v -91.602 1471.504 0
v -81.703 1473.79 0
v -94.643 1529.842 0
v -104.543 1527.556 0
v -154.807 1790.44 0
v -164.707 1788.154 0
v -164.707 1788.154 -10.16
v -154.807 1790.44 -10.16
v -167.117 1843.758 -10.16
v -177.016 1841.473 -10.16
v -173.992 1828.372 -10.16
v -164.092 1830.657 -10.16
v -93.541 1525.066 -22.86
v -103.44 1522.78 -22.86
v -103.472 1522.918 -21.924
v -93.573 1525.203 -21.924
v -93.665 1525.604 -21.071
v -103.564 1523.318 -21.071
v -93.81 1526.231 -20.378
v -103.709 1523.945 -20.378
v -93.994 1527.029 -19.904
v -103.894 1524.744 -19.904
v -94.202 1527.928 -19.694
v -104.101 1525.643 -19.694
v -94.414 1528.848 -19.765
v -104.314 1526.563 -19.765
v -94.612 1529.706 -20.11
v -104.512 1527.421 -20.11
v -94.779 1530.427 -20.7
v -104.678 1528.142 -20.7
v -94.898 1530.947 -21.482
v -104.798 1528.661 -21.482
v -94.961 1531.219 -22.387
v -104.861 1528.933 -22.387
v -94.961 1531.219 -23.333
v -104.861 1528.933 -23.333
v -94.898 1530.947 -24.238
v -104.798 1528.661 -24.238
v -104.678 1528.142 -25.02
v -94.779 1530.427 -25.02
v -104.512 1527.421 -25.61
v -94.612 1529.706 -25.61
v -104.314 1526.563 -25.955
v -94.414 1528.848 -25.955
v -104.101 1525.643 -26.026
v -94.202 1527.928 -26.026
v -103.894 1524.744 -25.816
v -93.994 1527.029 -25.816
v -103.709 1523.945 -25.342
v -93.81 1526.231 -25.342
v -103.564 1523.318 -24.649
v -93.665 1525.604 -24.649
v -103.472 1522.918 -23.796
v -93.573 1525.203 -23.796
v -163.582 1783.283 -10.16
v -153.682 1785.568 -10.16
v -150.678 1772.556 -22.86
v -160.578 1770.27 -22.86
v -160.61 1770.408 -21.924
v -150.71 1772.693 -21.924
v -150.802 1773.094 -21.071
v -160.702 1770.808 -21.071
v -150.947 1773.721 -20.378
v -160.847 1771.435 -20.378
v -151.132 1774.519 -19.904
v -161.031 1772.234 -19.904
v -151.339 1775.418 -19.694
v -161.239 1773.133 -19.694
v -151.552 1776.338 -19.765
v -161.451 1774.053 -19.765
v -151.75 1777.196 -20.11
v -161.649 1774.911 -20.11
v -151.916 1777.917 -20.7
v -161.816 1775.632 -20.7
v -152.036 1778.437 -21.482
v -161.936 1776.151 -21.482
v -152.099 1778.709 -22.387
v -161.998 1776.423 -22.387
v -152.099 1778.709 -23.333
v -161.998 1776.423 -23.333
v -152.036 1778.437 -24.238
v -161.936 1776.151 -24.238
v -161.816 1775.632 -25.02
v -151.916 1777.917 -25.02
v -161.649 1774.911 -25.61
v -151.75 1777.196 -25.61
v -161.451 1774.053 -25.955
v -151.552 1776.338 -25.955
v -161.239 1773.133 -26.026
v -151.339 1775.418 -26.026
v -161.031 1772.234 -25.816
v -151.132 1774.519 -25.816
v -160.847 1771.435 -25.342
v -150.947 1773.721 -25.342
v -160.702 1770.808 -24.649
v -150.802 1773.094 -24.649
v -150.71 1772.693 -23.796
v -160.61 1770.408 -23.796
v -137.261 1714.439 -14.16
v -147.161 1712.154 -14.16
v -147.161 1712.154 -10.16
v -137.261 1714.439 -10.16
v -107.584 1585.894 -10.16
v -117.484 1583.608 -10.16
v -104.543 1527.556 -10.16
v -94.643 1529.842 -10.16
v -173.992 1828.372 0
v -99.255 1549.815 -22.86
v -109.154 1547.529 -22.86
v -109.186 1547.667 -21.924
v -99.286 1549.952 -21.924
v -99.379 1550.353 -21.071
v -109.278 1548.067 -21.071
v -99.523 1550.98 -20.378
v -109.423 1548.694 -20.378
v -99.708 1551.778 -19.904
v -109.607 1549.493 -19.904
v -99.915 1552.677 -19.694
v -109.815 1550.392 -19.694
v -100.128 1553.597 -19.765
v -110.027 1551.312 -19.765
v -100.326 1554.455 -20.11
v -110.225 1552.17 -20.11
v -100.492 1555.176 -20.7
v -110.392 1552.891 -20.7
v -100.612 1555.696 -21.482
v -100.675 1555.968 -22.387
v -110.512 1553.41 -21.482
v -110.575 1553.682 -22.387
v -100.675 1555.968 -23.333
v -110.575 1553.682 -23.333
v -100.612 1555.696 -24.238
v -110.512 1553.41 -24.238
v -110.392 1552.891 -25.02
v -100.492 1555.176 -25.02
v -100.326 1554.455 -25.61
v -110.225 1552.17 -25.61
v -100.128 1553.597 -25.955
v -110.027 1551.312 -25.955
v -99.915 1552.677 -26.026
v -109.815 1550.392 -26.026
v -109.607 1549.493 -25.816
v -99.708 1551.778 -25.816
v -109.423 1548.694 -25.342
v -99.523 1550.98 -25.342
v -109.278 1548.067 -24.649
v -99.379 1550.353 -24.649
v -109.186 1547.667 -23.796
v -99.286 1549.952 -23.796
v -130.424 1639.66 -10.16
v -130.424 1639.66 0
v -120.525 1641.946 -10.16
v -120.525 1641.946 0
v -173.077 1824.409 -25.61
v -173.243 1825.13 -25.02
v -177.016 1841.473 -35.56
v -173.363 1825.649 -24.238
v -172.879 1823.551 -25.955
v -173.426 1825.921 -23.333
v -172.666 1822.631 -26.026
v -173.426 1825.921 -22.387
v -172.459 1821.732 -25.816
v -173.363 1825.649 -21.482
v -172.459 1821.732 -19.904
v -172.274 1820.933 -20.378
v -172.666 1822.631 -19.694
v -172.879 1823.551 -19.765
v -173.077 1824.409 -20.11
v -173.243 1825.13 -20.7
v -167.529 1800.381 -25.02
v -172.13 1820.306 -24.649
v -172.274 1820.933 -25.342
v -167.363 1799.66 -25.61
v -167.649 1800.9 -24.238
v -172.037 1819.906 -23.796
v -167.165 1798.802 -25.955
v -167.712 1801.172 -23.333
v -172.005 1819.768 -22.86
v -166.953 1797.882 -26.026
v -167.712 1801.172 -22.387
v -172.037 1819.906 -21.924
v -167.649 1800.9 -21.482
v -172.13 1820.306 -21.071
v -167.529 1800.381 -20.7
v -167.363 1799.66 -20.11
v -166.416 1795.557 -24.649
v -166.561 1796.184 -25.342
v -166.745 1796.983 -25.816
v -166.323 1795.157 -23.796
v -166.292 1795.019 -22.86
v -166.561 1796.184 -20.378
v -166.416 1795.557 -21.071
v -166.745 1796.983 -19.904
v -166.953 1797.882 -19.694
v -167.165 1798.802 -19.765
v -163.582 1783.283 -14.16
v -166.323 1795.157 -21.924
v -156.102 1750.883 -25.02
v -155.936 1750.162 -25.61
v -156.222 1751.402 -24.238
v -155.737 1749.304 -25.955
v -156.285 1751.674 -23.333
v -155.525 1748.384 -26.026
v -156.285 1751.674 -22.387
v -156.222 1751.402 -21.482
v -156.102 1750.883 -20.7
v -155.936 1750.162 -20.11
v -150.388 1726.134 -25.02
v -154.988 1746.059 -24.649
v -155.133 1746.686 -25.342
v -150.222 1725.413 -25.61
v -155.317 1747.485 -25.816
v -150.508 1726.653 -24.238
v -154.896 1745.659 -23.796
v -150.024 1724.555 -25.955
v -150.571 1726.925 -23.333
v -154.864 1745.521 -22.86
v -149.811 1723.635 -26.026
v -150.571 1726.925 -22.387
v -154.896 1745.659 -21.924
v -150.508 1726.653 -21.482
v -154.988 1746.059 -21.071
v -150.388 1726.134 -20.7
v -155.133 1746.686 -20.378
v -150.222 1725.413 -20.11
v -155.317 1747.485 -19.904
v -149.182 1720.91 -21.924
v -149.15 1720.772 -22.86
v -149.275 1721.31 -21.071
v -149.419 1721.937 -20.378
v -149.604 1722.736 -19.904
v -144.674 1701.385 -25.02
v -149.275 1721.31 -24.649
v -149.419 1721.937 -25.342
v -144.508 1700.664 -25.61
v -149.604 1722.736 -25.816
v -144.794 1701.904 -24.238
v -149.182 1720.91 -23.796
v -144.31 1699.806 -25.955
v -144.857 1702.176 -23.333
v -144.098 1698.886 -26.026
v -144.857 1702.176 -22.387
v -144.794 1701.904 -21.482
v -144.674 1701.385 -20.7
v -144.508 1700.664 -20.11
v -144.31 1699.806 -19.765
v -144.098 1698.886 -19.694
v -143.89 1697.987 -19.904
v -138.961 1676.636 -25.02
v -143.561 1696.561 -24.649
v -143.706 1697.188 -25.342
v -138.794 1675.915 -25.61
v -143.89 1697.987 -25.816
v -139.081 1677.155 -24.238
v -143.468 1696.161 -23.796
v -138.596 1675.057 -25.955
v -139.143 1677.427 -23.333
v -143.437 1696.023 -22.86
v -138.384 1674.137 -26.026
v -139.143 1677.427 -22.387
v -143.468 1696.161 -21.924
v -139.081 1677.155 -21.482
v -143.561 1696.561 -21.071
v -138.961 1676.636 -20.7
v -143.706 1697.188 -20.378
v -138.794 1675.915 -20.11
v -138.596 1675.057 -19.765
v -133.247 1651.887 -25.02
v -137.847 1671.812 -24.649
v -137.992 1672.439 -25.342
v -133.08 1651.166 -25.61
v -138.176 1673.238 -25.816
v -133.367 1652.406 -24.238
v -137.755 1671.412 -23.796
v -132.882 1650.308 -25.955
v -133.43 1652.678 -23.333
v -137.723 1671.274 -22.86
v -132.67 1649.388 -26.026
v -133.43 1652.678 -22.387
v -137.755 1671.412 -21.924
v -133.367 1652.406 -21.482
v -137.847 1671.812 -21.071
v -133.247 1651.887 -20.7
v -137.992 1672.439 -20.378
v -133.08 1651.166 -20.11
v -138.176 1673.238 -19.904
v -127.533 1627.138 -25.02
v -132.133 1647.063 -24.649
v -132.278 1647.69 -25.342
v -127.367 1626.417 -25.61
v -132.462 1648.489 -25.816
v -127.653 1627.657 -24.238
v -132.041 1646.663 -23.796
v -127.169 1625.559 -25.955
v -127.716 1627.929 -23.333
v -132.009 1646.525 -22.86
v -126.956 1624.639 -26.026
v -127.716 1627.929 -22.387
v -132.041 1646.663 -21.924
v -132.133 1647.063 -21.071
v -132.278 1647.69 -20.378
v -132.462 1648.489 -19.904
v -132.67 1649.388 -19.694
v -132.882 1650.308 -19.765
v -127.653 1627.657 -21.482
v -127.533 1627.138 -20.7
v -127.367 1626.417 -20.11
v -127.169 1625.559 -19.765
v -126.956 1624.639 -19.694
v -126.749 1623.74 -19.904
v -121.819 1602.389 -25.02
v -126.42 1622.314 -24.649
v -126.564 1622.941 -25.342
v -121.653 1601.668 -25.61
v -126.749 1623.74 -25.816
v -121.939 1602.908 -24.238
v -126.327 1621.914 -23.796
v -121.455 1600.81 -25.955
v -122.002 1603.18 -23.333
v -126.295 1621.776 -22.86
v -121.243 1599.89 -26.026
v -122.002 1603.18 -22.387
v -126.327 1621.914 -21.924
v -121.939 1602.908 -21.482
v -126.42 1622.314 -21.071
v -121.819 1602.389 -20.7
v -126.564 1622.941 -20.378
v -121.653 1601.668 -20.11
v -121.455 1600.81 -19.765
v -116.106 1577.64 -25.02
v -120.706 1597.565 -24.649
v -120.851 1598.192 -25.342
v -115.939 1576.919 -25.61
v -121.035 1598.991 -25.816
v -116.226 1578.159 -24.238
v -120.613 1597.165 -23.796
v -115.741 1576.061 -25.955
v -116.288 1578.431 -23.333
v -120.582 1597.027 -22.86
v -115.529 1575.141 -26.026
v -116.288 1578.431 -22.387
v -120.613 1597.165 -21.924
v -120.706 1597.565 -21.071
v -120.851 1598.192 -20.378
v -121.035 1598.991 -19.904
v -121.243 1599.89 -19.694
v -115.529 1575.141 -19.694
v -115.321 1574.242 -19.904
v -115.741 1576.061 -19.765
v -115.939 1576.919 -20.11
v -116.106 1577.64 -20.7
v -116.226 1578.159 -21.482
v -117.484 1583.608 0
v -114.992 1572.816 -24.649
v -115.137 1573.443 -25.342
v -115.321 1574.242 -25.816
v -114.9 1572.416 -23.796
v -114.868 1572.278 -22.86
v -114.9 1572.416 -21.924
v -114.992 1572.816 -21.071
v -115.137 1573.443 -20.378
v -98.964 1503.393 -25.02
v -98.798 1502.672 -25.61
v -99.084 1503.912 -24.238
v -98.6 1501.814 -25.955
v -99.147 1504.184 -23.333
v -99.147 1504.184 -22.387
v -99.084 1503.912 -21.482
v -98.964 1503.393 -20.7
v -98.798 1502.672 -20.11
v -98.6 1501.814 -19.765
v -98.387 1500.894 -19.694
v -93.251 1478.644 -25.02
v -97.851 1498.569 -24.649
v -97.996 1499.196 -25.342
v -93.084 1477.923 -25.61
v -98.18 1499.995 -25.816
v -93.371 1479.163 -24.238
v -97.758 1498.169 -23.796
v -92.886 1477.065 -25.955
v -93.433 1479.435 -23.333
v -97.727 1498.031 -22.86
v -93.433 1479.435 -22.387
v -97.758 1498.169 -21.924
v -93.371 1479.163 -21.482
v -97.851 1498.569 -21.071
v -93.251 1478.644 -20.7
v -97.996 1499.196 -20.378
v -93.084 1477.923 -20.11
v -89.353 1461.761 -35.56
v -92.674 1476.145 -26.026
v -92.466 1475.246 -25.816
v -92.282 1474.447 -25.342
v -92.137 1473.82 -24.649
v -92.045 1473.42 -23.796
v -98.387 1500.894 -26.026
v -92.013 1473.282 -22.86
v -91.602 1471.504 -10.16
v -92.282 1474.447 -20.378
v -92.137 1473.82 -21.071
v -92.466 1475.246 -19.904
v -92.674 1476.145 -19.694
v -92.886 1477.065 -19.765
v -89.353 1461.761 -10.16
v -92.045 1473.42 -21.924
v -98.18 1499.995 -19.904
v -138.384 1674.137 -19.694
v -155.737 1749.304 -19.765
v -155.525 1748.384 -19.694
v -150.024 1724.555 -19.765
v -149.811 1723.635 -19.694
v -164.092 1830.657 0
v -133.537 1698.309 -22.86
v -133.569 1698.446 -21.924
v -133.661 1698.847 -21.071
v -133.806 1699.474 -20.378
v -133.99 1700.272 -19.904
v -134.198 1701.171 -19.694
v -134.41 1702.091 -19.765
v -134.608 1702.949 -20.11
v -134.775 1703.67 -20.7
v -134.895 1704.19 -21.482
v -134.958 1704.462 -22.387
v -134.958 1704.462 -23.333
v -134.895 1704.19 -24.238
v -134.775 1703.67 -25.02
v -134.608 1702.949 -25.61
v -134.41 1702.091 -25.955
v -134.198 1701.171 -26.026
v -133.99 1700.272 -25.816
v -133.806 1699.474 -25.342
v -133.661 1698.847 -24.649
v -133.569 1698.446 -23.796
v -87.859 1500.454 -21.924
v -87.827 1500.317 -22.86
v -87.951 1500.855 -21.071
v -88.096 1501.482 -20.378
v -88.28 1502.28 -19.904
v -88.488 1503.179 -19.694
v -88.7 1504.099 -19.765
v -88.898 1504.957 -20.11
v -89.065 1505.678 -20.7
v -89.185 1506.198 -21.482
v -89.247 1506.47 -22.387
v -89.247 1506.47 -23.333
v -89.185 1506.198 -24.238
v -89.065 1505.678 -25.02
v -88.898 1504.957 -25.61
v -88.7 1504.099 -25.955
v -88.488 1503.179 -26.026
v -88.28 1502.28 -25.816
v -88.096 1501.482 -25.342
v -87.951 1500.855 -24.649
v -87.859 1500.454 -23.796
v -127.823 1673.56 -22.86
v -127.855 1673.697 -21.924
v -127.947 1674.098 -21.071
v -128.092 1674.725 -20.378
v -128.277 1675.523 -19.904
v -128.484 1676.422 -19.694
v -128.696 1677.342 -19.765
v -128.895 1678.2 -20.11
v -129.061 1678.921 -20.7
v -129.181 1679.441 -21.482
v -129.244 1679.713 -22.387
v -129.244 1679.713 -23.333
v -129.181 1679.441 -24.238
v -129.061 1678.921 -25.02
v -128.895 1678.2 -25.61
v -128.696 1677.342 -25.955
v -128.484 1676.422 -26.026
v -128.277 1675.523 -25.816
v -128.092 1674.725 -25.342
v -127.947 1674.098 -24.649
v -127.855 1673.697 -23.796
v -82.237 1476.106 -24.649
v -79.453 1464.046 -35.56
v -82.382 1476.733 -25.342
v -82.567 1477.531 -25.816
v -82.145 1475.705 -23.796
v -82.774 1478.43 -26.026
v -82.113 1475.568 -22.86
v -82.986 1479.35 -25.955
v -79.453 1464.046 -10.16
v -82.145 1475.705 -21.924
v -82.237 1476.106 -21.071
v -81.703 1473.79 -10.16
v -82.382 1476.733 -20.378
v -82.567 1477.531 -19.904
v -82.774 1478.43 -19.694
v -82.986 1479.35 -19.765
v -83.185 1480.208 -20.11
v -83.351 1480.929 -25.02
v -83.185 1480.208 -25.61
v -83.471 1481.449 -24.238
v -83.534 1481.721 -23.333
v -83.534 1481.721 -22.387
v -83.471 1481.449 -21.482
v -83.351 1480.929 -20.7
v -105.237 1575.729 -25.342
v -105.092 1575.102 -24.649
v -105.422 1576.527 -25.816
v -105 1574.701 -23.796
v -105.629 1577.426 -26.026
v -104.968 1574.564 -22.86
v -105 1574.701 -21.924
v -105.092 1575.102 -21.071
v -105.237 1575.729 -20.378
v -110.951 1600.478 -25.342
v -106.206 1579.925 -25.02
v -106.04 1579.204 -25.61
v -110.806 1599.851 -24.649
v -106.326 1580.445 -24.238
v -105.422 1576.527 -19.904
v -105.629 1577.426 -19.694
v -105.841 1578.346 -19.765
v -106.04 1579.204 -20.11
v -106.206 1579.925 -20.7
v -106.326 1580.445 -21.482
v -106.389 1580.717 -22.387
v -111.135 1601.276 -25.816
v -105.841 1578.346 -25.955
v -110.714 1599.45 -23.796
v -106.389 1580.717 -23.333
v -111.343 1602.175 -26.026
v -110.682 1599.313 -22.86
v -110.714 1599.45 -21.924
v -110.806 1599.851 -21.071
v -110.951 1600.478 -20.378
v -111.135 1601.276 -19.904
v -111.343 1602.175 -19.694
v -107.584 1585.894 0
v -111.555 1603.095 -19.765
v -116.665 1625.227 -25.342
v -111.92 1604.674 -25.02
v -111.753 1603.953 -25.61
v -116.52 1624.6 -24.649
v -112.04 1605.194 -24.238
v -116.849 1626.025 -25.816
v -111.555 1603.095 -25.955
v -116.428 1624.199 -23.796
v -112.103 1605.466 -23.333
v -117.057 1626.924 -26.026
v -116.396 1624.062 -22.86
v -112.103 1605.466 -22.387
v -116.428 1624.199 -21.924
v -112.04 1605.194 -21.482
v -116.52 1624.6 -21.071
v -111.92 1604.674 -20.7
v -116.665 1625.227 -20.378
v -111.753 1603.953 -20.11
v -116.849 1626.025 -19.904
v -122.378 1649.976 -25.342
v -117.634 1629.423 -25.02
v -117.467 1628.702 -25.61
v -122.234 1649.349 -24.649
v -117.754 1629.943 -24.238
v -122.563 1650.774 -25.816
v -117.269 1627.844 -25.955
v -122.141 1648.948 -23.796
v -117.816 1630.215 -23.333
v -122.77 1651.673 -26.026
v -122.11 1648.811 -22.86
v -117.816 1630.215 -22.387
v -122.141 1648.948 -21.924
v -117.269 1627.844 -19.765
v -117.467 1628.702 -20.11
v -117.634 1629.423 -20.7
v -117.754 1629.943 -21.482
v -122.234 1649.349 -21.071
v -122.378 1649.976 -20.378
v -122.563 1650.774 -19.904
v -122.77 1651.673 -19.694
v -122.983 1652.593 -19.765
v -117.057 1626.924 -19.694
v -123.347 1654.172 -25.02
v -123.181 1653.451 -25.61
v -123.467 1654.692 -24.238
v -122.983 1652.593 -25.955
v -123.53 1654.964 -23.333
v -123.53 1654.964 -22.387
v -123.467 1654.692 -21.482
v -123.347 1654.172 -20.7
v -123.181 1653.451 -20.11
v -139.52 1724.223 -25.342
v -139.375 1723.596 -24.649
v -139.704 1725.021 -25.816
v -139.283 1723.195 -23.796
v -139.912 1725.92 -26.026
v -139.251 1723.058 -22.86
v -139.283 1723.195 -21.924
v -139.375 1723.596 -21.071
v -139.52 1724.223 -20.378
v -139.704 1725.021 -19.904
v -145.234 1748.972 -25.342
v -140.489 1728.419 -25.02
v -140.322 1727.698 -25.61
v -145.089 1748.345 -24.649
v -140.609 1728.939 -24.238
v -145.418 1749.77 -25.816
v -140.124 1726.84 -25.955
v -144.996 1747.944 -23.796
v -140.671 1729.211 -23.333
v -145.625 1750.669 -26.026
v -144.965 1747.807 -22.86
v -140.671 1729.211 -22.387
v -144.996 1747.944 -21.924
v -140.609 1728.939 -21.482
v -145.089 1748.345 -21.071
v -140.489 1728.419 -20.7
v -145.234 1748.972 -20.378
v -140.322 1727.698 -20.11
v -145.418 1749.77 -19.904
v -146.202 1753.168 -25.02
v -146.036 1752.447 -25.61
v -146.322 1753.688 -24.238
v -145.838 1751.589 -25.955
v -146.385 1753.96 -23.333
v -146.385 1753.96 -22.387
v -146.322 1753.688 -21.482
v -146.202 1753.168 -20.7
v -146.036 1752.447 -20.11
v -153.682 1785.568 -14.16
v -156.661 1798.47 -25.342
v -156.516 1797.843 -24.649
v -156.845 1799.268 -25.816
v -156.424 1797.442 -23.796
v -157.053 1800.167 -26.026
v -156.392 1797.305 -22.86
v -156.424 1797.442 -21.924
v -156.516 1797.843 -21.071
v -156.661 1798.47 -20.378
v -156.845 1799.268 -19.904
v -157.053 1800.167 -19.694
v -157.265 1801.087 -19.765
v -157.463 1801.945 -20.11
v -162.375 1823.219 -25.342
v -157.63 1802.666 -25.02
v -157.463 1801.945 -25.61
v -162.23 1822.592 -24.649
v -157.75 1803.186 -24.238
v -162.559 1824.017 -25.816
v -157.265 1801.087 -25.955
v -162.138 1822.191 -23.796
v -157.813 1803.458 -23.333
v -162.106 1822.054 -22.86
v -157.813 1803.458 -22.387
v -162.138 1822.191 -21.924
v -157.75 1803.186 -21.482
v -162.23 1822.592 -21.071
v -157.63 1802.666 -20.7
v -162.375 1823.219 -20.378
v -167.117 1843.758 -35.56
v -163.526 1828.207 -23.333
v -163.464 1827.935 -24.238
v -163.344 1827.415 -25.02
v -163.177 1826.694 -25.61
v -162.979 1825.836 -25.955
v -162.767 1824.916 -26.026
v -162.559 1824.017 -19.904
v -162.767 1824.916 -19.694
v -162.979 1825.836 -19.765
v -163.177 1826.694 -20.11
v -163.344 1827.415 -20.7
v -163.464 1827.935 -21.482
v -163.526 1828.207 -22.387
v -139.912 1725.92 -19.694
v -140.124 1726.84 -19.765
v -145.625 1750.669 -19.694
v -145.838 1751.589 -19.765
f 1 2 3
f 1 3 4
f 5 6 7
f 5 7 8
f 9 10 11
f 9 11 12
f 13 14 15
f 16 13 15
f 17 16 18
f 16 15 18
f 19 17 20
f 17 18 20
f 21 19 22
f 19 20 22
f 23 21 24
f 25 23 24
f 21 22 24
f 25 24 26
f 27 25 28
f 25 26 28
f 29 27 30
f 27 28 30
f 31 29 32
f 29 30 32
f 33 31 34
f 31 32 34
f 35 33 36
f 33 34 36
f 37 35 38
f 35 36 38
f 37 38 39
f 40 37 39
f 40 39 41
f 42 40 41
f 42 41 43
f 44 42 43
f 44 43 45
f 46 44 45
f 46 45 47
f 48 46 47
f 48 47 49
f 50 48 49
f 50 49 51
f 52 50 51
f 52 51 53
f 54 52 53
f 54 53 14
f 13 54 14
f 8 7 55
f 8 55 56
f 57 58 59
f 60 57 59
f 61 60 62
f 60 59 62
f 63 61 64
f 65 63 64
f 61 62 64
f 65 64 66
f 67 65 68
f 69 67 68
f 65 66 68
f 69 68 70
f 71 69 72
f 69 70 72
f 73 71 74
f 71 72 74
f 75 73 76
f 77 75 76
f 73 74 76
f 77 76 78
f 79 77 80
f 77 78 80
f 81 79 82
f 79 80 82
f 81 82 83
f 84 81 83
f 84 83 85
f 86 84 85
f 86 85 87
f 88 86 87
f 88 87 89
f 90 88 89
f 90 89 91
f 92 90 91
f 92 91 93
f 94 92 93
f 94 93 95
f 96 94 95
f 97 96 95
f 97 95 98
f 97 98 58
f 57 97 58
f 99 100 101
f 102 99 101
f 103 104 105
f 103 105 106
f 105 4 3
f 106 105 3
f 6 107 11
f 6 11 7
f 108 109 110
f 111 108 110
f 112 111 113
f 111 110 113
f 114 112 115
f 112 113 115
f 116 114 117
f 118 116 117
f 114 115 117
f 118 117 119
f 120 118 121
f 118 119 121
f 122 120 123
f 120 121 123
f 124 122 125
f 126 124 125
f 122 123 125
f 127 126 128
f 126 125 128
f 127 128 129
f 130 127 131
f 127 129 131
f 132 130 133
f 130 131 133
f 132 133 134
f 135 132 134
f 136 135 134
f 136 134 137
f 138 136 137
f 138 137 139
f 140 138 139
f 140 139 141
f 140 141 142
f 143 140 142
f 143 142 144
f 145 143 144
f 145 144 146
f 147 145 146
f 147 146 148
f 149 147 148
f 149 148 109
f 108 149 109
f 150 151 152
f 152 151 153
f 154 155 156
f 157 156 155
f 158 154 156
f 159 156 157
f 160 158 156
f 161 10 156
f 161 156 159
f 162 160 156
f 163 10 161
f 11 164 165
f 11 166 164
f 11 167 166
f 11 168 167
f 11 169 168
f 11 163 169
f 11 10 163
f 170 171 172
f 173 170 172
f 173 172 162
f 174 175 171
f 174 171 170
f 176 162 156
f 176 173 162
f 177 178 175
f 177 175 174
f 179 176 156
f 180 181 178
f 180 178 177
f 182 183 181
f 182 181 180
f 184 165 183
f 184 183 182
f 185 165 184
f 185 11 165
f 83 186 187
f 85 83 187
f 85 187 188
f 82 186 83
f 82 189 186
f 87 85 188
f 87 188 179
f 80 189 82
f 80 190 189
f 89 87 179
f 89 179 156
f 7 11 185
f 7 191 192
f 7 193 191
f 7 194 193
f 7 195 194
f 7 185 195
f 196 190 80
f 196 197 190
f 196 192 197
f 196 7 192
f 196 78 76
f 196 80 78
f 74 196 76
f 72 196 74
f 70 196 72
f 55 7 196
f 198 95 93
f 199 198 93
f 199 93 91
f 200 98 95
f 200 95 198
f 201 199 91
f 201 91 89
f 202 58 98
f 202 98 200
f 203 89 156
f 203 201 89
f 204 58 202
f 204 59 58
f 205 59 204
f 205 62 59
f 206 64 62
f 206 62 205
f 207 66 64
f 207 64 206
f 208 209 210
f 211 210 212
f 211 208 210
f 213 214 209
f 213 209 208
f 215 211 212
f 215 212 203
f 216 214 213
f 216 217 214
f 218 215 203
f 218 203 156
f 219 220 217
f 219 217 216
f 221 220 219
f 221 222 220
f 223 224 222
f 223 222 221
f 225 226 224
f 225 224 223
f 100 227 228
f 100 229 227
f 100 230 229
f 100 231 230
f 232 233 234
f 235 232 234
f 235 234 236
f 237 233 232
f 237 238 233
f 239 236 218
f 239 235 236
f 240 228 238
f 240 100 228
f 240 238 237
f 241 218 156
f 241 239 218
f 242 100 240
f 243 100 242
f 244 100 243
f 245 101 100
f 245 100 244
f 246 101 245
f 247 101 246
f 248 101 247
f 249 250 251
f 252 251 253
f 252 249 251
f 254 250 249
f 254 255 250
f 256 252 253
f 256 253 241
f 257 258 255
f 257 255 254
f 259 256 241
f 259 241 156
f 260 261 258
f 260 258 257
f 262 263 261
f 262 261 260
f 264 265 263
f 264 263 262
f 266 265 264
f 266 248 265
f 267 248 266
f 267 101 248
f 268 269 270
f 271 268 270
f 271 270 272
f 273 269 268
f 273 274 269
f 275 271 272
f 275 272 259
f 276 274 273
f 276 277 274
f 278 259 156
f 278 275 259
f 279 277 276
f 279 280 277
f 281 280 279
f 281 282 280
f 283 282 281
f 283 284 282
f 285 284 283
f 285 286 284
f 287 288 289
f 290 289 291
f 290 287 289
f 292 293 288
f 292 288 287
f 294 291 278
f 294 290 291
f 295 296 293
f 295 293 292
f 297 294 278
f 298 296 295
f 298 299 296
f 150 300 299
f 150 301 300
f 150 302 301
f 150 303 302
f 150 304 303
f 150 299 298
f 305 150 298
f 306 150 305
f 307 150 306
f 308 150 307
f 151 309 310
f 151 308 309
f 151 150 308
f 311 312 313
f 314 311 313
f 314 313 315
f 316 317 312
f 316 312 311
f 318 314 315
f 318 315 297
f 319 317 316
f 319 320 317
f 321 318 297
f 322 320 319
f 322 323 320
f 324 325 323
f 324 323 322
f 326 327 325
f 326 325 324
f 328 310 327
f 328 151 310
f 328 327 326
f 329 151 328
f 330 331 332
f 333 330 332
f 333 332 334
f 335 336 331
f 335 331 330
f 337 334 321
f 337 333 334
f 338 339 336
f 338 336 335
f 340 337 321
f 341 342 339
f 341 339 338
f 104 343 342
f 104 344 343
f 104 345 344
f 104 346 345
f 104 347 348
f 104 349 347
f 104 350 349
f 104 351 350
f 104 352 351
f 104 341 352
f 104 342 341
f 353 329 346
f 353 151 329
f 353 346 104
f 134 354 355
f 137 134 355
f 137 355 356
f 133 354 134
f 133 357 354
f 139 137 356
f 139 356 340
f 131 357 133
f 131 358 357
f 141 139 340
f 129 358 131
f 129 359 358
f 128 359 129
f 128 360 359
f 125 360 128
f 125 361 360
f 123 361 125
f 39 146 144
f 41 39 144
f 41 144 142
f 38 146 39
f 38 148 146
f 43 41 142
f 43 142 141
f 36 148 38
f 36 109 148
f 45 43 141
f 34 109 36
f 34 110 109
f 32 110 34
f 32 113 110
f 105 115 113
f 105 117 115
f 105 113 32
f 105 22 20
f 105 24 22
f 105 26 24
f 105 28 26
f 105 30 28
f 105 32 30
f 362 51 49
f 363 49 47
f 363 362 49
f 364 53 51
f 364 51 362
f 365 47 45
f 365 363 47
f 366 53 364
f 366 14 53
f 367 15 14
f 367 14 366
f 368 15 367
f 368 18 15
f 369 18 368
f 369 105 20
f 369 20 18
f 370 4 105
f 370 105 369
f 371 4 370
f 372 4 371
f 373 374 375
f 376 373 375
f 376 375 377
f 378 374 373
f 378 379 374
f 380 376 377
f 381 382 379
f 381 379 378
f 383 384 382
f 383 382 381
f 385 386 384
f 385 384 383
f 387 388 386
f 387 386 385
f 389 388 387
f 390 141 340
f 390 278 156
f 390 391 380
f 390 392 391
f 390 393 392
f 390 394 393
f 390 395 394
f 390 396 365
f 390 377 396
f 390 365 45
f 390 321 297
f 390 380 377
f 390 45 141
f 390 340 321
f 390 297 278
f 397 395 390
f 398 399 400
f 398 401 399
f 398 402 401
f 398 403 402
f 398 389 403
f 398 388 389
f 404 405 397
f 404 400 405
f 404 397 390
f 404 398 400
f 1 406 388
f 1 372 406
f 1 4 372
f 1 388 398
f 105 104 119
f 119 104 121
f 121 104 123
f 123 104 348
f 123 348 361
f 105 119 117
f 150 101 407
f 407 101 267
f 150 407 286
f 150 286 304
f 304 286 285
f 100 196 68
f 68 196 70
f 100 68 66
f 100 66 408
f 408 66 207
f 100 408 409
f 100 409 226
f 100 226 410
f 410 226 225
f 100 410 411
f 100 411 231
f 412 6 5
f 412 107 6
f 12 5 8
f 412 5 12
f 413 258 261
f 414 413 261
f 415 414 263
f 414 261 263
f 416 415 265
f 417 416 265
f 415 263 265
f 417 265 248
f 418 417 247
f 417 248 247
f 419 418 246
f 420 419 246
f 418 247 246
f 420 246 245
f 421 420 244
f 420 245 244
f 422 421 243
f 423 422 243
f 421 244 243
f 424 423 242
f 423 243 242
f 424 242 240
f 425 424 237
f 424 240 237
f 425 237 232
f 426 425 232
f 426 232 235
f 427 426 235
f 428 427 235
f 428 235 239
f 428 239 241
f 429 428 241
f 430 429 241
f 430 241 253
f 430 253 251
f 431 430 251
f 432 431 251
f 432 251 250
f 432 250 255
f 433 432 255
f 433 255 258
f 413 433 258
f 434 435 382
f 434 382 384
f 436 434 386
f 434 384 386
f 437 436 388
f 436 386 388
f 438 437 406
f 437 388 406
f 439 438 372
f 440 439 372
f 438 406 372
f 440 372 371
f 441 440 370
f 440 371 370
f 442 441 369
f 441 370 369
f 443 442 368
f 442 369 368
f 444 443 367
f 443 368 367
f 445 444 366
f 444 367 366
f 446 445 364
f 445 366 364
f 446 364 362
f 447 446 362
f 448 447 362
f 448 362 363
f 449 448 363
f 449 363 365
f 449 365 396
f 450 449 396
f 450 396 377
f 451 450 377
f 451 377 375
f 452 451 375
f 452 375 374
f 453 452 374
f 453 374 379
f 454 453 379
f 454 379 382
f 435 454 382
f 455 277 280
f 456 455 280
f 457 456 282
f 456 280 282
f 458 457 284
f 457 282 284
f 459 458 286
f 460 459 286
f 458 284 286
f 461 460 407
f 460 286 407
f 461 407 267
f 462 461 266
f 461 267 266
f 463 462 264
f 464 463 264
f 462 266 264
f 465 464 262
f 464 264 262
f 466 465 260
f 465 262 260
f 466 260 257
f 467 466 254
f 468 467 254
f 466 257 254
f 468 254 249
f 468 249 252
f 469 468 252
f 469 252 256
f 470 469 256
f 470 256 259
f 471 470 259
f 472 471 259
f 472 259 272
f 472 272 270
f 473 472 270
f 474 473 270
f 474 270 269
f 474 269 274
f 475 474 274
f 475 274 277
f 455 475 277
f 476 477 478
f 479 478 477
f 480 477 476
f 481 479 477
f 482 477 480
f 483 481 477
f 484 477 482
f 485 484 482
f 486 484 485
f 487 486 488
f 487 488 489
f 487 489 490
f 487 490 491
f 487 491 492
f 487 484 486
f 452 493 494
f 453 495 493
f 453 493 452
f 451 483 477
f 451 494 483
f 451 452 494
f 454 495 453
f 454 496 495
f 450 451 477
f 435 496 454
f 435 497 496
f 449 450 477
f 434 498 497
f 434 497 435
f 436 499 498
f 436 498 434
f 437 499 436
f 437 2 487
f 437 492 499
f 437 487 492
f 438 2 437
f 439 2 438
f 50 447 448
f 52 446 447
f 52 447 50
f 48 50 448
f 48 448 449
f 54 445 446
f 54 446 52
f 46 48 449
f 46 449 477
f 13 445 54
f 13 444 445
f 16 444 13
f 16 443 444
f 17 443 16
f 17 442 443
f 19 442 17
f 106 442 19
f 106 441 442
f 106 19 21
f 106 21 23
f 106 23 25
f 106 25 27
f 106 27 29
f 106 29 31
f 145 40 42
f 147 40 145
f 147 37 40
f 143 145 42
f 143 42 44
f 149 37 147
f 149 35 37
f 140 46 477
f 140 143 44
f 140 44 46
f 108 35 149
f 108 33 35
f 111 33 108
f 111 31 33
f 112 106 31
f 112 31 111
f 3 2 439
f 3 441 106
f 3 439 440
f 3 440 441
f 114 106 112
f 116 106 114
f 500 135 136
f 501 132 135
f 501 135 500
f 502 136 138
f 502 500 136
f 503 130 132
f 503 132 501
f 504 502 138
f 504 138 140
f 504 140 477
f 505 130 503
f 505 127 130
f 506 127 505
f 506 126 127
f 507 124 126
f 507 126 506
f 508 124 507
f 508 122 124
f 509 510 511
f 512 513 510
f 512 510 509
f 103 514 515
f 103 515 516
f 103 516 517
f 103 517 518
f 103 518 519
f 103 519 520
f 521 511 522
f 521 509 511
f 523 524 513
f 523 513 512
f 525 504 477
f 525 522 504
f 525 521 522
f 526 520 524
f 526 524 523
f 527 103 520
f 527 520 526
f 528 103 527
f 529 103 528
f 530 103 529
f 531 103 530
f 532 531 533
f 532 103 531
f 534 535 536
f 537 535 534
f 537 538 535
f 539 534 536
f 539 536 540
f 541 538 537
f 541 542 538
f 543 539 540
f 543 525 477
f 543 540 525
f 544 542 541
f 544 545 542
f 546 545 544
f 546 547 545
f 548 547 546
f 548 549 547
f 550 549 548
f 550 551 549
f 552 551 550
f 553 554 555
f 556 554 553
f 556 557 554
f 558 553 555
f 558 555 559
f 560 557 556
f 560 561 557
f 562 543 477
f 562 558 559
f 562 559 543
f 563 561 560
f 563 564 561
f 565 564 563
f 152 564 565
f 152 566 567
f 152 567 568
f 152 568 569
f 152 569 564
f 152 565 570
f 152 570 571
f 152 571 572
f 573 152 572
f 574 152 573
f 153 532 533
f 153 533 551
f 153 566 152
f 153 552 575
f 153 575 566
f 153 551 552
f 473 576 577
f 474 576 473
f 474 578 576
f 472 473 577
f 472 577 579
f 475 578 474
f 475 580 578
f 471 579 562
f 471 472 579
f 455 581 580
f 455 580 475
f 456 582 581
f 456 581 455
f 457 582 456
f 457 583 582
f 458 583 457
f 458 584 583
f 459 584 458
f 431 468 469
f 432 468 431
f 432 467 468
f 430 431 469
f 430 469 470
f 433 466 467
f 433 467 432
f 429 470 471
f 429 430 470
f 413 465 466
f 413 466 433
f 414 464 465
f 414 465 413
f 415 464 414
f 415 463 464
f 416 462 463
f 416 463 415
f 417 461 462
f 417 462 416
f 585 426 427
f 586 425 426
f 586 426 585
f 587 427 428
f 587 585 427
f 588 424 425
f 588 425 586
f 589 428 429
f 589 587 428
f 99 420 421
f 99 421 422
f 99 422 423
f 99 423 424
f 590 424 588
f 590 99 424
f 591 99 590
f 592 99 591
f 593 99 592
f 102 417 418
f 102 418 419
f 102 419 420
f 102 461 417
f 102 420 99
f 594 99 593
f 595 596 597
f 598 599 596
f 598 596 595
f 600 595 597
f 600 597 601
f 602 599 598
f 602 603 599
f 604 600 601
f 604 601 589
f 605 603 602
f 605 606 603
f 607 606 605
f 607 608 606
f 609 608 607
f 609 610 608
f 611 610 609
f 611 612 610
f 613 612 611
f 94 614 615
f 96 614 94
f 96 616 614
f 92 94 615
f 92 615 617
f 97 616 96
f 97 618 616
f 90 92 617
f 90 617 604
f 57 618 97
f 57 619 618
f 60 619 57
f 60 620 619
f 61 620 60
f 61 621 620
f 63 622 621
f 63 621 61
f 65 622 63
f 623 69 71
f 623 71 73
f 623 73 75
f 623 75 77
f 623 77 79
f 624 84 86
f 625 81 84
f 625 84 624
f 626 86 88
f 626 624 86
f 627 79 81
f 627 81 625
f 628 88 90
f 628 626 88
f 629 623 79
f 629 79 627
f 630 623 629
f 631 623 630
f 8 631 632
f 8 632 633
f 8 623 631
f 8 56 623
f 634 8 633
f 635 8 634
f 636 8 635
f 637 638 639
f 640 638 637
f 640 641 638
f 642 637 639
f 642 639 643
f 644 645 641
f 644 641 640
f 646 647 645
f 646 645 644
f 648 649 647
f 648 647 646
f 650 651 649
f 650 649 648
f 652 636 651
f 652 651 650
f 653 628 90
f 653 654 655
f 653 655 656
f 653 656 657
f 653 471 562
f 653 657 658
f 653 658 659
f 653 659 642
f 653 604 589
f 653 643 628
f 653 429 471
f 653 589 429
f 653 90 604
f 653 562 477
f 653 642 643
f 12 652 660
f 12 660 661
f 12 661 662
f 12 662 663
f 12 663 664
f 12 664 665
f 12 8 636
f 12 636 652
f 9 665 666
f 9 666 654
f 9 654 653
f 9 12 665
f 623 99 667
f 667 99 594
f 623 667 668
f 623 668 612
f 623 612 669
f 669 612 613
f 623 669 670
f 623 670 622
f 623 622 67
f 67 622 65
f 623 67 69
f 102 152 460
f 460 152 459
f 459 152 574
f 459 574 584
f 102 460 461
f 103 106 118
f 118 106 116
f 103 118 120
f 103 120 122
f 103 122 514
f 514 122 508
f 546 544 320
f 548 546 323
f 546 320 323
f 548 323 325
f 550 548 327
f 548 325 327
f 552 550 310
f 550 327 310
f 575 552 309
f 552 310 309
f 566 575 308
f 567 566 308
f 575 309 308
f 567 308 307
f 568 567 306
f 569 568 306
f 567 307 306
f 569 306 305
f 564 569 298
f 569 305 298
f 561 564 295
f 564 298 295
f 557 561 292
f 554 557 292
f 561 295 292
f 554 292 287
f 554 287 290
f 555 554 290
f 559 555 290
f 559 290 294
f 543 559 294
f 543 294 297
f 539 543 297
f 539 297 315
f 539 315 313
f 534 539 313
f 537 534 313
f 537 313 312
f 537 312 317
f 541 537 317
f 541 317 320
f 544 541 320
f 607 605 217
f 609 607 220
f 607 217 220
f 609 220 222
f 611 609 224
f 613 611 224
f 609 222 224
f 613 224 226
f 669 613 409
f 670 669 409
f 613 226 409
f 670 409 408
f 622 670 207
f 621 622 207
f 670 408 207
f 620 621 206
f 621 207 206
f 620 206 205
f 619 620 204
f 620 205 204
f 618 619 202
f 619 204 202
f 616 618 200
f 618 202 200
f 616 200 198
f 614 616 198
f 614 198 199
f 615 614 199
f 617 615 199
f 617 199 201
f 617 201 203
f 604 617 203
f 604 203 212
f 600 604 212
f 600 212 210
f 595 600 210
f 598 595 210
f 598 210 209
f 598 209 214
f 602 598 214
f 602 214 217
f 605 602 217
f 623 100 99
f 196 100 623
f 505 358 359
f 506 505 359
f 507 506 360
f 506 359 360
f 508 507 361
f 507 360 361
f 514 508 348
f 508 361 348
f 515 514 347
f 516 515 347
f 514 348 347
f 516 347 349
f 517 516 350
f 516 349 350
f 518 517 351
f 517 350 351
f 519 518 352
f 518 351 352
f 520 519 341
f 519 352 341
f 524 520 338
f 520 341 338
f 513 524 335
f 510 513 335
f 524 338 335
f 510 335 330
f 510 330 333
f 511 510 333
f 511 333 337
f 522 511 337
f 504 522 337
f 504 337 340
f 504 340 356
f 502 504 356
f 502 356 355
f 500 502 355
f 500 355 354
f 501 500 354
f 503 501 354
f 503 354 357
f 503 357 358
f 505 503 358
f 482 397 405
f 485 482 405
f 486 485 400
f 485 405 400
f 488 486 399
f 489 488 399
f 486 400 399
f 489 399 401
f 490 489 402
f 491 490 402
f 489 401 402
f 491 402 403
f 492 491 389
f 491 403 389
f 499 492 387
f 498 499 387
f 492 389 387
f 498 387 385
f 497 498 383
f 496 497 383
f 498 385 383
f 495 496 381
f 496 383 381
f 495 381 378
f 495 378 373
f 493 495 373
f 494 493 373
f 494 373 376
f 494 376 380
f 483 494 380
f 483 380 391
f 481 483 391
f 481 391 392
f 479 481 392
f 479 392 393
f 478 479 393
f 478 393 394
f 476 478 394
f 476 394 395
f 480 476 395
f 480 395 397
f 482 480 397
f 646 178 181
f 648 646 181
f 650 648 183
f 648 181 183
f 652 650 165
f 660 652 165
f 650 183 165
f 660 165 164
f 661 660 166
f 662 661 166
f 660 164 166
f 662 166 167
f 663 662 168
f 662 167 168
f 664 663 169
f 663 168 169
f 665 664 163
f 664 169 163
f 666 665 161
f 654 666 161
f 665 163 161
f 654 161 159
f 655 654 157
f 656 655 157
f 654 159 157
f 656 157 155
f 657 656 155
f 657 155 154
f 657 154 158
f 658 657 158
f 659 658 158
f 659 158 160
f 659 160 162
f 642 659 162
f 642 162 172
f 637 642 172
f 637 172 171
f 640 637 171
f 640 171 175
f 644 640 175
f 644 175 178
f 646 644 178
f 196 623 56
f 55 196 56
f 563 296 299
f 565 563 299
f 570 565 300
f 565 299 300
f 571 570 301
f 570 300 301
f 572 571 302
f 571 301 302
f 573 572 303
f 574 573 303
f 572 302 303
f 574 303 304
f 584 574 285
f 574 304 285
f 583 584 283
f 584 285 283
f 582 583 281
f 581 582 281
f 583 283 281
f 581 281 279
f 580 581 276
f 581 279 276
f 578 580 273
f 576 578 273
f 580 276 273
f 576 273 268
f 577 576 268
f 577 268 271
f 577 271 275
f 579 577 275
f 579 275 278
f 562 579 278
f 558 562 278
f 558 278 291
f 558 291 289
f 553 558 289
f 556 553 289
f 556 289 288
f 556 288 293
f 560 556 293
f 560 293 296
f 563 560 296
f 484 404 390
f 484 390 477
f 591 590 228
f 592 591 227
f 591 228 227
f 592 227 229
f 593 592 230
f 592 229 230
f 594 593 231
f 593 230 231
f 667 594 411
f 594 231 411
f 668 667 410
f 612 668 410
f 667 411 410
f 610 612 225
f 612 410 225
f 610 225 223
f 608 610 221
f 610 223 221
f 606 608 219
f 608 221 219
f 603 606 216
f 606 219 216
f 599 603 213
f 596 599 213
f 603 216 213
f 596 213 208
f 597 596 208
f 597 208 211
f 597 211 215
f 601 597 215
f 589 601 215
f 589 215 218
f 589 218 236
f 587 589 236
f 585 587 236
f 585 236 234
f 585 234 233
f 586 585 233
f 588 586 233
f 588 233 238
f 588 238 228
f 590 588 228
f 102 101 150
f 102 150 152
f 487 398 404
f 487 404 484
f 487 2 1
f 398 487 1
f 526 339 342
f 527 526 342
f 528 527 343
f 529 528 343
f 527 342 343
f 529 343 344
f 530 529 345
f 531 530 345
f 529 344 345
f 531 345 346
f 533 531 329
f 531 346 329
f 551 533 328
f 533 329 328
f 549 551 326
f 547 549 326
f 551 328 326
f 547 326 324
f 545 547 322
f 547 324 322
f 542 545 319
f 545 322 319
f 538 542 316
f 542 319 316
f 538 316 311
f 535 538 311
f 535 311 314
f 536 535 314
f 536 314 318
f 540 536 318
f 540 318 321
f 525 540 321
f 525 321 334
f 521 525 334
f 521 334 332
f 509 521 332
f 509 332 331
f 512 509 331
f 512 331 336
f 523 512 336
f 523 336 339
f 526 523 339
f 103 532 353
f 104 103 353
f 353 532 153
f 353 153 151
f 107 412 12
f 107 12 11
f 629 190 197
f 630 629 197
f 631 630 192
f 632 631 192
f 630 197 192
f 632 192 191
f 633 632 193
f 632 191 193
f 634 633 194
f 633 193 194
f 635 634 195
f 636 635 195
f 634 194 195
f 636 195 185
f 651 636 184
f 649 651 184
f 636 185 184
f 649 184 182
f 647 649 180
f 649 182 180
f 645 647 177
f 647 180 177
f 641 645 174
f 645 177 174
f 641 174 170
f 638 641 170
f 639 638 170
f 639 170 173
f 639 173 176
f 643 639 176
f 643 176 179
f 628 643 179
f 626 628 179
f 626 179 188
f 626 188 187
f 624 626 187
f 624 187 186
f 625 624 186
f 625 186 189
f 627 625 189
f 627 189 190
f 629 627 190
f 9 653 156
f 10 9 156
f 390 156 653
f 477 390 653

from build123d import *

# Parameters (mm, degrees)
BOSS_EXTRUDE1_DEPTH   = 10.16
BOSS_EXTRUDE1_2_DEPTH = 10.16
BOSS_EXTRUDE1_3_DEPTH = 10.16
BOSS_EXTRUDE2_DEPTH   = 25.4
SKETCH3_R             = 3.175
SKETCH3_W             = 29.218678694
SKETCH3_H             = 73
CUT_EXTRUDE1_DEPTH    = 1837.667023453


with BuildPart() as part:
    # Sketch1 → Boss-Extrude1 (new body)
    with BuildSketch(Plane.XY):
        Polygon((-120.524654614, 1641.945974367), (-107.584015199, 1585.893906943), (-117.483615058, 1583.608404231), (-130.424254473, 1639.660471655), align=None)
    extrude(amount=-BOSS_EXTRUDE1_DEPTH)



with BuildPart() as body_2:
    # Sketch1 → Boss-Extrude1 2 (new body)
    with BuildSketch(Plane.XY):
        Polygon((-104.542975642, 1527.556336807), (-94.643375784, 1529.841839519), (-81.702736369, 1473.789772095), (-91.602336227, 1471.504269383), align=None)
    extrude(amount=-BOSS_EXTRUDE1_2_DEPTH)


with BuildPart() as body_3:
    # Sketch1 → Boss-Extrude1 3 (new body)
    with BuildSketch(Plane.XY):
        Polygon((-164.706795155, 1788.154469528), (-154.807195296, 1790.43997224), (-164.092050064, 1830.657096664), (-173.991649923, 1828.371593952), align=None)
    extrude(amount=-BOSS_EXTRUDE1_3_DEPTH)


with BuildPart() as part_1:
    add(part.part)

    add(body_2.part)  # Boss-Extrude2 merges body 2

    add(body_3.part)  # Boss-Extrude2 merges body 3
    # Sketch2 → Boss-Extrude2 (add)
    with BuildSketch(Plane(origin=(0, 0, -10.16), x_dir=(-1, 0, 0), z_dir=(0, 0, -1))):
        Polygon((177.016251562, 1841.472582982), (89.352825684, 1461.760568735), (79.453225826, 1464.046071447), (167.116651704, 1843.758085694), align=None)
    extrude(amount=BOSS_EXTRUDE2_DEPTH)

    # Sketch3 → Cut-Extrude1 (cut, through all)
    with BuildSketch(Plane(origin=(235.565521709, 54.384585889, 0), x_dir=(0, 0, 1), z_dir=(-0.974370064785235, -0.22495105434386642, 0))):
        with Locations(Location((-22.86, 1459.395752405, 0), (0, 0, 270))):
            Circle(SKETCH3_R)
        with Locations(Location((-22.86, 1484.795752405, 0), (0, 0, 270))):
            Circle(SKETCH3_R)
        with Locations(Location((-22.86, 1510.195752405, 0), (0, 0, 270))):
            Circle(SKETCH3_R)
        with Locations(Location((-22.86, 1535.595752405, 0), (0, 0, 270))):
            Circle(SKETCH3_R)
        with Locations(Location((-22.86, 1560.995752405, 0), (0, 0, 270))):
            Circle(SKETCH3_R)
        with Locations(Location((-22.86, 1586.395752405, 0), (0, 0, 270))):
            Circle(SKETCH3_R)
        with Locations(Location((-22.86, 1611.795752405, 0), (0, 0, 270))):
            Circle(SKETCH3_R)
        with Locations(Location((-22.86, 1637.195752405, 0), (0, 0, 270))):
            Circle(SKETCH3_R)
        with Locations(Location((-22.86, 1662.595752405, 0), (0, 0, 270))):
            Circle(SKETCH3_R)
        with Locations(Location((-22.86, 1687.995752405, 0), (0, 0, 270))):
            Circle(SKETCH3_R)
        with Locations(Location((-22.86, 1713.395752405, 0), (0, 0, 270))):
            Circle(SKETCH3_R)
        with Locations(Location((-22.86, 1738.795752405, 0), (0, 0, 270))):
            Circle(SKETCH3_R)
        with Locations(Location((-22.86, 1764.195752405, 0), (0, 0, 270))):
            Circle(SKETCH3_R)
        with Locations(Location((-22.86, 1789.595752405, 0), (0, 0, 270))):
            Circle(SKETCH3_R)
        with Locations(Location((-22.86, 1814.995752405, 0), (0, 0, 270))):
            Circle(SKETCH3_R)
        with Locations((0.449339347, 1737.875153548)):
            Rectangle(SKETCH3_W, SKETCH3_H)
    extrude(amount=-CUT_EXTRUDE1_DEPTH, mode=Mode.SUBTRACT)


solid = part_1.part
